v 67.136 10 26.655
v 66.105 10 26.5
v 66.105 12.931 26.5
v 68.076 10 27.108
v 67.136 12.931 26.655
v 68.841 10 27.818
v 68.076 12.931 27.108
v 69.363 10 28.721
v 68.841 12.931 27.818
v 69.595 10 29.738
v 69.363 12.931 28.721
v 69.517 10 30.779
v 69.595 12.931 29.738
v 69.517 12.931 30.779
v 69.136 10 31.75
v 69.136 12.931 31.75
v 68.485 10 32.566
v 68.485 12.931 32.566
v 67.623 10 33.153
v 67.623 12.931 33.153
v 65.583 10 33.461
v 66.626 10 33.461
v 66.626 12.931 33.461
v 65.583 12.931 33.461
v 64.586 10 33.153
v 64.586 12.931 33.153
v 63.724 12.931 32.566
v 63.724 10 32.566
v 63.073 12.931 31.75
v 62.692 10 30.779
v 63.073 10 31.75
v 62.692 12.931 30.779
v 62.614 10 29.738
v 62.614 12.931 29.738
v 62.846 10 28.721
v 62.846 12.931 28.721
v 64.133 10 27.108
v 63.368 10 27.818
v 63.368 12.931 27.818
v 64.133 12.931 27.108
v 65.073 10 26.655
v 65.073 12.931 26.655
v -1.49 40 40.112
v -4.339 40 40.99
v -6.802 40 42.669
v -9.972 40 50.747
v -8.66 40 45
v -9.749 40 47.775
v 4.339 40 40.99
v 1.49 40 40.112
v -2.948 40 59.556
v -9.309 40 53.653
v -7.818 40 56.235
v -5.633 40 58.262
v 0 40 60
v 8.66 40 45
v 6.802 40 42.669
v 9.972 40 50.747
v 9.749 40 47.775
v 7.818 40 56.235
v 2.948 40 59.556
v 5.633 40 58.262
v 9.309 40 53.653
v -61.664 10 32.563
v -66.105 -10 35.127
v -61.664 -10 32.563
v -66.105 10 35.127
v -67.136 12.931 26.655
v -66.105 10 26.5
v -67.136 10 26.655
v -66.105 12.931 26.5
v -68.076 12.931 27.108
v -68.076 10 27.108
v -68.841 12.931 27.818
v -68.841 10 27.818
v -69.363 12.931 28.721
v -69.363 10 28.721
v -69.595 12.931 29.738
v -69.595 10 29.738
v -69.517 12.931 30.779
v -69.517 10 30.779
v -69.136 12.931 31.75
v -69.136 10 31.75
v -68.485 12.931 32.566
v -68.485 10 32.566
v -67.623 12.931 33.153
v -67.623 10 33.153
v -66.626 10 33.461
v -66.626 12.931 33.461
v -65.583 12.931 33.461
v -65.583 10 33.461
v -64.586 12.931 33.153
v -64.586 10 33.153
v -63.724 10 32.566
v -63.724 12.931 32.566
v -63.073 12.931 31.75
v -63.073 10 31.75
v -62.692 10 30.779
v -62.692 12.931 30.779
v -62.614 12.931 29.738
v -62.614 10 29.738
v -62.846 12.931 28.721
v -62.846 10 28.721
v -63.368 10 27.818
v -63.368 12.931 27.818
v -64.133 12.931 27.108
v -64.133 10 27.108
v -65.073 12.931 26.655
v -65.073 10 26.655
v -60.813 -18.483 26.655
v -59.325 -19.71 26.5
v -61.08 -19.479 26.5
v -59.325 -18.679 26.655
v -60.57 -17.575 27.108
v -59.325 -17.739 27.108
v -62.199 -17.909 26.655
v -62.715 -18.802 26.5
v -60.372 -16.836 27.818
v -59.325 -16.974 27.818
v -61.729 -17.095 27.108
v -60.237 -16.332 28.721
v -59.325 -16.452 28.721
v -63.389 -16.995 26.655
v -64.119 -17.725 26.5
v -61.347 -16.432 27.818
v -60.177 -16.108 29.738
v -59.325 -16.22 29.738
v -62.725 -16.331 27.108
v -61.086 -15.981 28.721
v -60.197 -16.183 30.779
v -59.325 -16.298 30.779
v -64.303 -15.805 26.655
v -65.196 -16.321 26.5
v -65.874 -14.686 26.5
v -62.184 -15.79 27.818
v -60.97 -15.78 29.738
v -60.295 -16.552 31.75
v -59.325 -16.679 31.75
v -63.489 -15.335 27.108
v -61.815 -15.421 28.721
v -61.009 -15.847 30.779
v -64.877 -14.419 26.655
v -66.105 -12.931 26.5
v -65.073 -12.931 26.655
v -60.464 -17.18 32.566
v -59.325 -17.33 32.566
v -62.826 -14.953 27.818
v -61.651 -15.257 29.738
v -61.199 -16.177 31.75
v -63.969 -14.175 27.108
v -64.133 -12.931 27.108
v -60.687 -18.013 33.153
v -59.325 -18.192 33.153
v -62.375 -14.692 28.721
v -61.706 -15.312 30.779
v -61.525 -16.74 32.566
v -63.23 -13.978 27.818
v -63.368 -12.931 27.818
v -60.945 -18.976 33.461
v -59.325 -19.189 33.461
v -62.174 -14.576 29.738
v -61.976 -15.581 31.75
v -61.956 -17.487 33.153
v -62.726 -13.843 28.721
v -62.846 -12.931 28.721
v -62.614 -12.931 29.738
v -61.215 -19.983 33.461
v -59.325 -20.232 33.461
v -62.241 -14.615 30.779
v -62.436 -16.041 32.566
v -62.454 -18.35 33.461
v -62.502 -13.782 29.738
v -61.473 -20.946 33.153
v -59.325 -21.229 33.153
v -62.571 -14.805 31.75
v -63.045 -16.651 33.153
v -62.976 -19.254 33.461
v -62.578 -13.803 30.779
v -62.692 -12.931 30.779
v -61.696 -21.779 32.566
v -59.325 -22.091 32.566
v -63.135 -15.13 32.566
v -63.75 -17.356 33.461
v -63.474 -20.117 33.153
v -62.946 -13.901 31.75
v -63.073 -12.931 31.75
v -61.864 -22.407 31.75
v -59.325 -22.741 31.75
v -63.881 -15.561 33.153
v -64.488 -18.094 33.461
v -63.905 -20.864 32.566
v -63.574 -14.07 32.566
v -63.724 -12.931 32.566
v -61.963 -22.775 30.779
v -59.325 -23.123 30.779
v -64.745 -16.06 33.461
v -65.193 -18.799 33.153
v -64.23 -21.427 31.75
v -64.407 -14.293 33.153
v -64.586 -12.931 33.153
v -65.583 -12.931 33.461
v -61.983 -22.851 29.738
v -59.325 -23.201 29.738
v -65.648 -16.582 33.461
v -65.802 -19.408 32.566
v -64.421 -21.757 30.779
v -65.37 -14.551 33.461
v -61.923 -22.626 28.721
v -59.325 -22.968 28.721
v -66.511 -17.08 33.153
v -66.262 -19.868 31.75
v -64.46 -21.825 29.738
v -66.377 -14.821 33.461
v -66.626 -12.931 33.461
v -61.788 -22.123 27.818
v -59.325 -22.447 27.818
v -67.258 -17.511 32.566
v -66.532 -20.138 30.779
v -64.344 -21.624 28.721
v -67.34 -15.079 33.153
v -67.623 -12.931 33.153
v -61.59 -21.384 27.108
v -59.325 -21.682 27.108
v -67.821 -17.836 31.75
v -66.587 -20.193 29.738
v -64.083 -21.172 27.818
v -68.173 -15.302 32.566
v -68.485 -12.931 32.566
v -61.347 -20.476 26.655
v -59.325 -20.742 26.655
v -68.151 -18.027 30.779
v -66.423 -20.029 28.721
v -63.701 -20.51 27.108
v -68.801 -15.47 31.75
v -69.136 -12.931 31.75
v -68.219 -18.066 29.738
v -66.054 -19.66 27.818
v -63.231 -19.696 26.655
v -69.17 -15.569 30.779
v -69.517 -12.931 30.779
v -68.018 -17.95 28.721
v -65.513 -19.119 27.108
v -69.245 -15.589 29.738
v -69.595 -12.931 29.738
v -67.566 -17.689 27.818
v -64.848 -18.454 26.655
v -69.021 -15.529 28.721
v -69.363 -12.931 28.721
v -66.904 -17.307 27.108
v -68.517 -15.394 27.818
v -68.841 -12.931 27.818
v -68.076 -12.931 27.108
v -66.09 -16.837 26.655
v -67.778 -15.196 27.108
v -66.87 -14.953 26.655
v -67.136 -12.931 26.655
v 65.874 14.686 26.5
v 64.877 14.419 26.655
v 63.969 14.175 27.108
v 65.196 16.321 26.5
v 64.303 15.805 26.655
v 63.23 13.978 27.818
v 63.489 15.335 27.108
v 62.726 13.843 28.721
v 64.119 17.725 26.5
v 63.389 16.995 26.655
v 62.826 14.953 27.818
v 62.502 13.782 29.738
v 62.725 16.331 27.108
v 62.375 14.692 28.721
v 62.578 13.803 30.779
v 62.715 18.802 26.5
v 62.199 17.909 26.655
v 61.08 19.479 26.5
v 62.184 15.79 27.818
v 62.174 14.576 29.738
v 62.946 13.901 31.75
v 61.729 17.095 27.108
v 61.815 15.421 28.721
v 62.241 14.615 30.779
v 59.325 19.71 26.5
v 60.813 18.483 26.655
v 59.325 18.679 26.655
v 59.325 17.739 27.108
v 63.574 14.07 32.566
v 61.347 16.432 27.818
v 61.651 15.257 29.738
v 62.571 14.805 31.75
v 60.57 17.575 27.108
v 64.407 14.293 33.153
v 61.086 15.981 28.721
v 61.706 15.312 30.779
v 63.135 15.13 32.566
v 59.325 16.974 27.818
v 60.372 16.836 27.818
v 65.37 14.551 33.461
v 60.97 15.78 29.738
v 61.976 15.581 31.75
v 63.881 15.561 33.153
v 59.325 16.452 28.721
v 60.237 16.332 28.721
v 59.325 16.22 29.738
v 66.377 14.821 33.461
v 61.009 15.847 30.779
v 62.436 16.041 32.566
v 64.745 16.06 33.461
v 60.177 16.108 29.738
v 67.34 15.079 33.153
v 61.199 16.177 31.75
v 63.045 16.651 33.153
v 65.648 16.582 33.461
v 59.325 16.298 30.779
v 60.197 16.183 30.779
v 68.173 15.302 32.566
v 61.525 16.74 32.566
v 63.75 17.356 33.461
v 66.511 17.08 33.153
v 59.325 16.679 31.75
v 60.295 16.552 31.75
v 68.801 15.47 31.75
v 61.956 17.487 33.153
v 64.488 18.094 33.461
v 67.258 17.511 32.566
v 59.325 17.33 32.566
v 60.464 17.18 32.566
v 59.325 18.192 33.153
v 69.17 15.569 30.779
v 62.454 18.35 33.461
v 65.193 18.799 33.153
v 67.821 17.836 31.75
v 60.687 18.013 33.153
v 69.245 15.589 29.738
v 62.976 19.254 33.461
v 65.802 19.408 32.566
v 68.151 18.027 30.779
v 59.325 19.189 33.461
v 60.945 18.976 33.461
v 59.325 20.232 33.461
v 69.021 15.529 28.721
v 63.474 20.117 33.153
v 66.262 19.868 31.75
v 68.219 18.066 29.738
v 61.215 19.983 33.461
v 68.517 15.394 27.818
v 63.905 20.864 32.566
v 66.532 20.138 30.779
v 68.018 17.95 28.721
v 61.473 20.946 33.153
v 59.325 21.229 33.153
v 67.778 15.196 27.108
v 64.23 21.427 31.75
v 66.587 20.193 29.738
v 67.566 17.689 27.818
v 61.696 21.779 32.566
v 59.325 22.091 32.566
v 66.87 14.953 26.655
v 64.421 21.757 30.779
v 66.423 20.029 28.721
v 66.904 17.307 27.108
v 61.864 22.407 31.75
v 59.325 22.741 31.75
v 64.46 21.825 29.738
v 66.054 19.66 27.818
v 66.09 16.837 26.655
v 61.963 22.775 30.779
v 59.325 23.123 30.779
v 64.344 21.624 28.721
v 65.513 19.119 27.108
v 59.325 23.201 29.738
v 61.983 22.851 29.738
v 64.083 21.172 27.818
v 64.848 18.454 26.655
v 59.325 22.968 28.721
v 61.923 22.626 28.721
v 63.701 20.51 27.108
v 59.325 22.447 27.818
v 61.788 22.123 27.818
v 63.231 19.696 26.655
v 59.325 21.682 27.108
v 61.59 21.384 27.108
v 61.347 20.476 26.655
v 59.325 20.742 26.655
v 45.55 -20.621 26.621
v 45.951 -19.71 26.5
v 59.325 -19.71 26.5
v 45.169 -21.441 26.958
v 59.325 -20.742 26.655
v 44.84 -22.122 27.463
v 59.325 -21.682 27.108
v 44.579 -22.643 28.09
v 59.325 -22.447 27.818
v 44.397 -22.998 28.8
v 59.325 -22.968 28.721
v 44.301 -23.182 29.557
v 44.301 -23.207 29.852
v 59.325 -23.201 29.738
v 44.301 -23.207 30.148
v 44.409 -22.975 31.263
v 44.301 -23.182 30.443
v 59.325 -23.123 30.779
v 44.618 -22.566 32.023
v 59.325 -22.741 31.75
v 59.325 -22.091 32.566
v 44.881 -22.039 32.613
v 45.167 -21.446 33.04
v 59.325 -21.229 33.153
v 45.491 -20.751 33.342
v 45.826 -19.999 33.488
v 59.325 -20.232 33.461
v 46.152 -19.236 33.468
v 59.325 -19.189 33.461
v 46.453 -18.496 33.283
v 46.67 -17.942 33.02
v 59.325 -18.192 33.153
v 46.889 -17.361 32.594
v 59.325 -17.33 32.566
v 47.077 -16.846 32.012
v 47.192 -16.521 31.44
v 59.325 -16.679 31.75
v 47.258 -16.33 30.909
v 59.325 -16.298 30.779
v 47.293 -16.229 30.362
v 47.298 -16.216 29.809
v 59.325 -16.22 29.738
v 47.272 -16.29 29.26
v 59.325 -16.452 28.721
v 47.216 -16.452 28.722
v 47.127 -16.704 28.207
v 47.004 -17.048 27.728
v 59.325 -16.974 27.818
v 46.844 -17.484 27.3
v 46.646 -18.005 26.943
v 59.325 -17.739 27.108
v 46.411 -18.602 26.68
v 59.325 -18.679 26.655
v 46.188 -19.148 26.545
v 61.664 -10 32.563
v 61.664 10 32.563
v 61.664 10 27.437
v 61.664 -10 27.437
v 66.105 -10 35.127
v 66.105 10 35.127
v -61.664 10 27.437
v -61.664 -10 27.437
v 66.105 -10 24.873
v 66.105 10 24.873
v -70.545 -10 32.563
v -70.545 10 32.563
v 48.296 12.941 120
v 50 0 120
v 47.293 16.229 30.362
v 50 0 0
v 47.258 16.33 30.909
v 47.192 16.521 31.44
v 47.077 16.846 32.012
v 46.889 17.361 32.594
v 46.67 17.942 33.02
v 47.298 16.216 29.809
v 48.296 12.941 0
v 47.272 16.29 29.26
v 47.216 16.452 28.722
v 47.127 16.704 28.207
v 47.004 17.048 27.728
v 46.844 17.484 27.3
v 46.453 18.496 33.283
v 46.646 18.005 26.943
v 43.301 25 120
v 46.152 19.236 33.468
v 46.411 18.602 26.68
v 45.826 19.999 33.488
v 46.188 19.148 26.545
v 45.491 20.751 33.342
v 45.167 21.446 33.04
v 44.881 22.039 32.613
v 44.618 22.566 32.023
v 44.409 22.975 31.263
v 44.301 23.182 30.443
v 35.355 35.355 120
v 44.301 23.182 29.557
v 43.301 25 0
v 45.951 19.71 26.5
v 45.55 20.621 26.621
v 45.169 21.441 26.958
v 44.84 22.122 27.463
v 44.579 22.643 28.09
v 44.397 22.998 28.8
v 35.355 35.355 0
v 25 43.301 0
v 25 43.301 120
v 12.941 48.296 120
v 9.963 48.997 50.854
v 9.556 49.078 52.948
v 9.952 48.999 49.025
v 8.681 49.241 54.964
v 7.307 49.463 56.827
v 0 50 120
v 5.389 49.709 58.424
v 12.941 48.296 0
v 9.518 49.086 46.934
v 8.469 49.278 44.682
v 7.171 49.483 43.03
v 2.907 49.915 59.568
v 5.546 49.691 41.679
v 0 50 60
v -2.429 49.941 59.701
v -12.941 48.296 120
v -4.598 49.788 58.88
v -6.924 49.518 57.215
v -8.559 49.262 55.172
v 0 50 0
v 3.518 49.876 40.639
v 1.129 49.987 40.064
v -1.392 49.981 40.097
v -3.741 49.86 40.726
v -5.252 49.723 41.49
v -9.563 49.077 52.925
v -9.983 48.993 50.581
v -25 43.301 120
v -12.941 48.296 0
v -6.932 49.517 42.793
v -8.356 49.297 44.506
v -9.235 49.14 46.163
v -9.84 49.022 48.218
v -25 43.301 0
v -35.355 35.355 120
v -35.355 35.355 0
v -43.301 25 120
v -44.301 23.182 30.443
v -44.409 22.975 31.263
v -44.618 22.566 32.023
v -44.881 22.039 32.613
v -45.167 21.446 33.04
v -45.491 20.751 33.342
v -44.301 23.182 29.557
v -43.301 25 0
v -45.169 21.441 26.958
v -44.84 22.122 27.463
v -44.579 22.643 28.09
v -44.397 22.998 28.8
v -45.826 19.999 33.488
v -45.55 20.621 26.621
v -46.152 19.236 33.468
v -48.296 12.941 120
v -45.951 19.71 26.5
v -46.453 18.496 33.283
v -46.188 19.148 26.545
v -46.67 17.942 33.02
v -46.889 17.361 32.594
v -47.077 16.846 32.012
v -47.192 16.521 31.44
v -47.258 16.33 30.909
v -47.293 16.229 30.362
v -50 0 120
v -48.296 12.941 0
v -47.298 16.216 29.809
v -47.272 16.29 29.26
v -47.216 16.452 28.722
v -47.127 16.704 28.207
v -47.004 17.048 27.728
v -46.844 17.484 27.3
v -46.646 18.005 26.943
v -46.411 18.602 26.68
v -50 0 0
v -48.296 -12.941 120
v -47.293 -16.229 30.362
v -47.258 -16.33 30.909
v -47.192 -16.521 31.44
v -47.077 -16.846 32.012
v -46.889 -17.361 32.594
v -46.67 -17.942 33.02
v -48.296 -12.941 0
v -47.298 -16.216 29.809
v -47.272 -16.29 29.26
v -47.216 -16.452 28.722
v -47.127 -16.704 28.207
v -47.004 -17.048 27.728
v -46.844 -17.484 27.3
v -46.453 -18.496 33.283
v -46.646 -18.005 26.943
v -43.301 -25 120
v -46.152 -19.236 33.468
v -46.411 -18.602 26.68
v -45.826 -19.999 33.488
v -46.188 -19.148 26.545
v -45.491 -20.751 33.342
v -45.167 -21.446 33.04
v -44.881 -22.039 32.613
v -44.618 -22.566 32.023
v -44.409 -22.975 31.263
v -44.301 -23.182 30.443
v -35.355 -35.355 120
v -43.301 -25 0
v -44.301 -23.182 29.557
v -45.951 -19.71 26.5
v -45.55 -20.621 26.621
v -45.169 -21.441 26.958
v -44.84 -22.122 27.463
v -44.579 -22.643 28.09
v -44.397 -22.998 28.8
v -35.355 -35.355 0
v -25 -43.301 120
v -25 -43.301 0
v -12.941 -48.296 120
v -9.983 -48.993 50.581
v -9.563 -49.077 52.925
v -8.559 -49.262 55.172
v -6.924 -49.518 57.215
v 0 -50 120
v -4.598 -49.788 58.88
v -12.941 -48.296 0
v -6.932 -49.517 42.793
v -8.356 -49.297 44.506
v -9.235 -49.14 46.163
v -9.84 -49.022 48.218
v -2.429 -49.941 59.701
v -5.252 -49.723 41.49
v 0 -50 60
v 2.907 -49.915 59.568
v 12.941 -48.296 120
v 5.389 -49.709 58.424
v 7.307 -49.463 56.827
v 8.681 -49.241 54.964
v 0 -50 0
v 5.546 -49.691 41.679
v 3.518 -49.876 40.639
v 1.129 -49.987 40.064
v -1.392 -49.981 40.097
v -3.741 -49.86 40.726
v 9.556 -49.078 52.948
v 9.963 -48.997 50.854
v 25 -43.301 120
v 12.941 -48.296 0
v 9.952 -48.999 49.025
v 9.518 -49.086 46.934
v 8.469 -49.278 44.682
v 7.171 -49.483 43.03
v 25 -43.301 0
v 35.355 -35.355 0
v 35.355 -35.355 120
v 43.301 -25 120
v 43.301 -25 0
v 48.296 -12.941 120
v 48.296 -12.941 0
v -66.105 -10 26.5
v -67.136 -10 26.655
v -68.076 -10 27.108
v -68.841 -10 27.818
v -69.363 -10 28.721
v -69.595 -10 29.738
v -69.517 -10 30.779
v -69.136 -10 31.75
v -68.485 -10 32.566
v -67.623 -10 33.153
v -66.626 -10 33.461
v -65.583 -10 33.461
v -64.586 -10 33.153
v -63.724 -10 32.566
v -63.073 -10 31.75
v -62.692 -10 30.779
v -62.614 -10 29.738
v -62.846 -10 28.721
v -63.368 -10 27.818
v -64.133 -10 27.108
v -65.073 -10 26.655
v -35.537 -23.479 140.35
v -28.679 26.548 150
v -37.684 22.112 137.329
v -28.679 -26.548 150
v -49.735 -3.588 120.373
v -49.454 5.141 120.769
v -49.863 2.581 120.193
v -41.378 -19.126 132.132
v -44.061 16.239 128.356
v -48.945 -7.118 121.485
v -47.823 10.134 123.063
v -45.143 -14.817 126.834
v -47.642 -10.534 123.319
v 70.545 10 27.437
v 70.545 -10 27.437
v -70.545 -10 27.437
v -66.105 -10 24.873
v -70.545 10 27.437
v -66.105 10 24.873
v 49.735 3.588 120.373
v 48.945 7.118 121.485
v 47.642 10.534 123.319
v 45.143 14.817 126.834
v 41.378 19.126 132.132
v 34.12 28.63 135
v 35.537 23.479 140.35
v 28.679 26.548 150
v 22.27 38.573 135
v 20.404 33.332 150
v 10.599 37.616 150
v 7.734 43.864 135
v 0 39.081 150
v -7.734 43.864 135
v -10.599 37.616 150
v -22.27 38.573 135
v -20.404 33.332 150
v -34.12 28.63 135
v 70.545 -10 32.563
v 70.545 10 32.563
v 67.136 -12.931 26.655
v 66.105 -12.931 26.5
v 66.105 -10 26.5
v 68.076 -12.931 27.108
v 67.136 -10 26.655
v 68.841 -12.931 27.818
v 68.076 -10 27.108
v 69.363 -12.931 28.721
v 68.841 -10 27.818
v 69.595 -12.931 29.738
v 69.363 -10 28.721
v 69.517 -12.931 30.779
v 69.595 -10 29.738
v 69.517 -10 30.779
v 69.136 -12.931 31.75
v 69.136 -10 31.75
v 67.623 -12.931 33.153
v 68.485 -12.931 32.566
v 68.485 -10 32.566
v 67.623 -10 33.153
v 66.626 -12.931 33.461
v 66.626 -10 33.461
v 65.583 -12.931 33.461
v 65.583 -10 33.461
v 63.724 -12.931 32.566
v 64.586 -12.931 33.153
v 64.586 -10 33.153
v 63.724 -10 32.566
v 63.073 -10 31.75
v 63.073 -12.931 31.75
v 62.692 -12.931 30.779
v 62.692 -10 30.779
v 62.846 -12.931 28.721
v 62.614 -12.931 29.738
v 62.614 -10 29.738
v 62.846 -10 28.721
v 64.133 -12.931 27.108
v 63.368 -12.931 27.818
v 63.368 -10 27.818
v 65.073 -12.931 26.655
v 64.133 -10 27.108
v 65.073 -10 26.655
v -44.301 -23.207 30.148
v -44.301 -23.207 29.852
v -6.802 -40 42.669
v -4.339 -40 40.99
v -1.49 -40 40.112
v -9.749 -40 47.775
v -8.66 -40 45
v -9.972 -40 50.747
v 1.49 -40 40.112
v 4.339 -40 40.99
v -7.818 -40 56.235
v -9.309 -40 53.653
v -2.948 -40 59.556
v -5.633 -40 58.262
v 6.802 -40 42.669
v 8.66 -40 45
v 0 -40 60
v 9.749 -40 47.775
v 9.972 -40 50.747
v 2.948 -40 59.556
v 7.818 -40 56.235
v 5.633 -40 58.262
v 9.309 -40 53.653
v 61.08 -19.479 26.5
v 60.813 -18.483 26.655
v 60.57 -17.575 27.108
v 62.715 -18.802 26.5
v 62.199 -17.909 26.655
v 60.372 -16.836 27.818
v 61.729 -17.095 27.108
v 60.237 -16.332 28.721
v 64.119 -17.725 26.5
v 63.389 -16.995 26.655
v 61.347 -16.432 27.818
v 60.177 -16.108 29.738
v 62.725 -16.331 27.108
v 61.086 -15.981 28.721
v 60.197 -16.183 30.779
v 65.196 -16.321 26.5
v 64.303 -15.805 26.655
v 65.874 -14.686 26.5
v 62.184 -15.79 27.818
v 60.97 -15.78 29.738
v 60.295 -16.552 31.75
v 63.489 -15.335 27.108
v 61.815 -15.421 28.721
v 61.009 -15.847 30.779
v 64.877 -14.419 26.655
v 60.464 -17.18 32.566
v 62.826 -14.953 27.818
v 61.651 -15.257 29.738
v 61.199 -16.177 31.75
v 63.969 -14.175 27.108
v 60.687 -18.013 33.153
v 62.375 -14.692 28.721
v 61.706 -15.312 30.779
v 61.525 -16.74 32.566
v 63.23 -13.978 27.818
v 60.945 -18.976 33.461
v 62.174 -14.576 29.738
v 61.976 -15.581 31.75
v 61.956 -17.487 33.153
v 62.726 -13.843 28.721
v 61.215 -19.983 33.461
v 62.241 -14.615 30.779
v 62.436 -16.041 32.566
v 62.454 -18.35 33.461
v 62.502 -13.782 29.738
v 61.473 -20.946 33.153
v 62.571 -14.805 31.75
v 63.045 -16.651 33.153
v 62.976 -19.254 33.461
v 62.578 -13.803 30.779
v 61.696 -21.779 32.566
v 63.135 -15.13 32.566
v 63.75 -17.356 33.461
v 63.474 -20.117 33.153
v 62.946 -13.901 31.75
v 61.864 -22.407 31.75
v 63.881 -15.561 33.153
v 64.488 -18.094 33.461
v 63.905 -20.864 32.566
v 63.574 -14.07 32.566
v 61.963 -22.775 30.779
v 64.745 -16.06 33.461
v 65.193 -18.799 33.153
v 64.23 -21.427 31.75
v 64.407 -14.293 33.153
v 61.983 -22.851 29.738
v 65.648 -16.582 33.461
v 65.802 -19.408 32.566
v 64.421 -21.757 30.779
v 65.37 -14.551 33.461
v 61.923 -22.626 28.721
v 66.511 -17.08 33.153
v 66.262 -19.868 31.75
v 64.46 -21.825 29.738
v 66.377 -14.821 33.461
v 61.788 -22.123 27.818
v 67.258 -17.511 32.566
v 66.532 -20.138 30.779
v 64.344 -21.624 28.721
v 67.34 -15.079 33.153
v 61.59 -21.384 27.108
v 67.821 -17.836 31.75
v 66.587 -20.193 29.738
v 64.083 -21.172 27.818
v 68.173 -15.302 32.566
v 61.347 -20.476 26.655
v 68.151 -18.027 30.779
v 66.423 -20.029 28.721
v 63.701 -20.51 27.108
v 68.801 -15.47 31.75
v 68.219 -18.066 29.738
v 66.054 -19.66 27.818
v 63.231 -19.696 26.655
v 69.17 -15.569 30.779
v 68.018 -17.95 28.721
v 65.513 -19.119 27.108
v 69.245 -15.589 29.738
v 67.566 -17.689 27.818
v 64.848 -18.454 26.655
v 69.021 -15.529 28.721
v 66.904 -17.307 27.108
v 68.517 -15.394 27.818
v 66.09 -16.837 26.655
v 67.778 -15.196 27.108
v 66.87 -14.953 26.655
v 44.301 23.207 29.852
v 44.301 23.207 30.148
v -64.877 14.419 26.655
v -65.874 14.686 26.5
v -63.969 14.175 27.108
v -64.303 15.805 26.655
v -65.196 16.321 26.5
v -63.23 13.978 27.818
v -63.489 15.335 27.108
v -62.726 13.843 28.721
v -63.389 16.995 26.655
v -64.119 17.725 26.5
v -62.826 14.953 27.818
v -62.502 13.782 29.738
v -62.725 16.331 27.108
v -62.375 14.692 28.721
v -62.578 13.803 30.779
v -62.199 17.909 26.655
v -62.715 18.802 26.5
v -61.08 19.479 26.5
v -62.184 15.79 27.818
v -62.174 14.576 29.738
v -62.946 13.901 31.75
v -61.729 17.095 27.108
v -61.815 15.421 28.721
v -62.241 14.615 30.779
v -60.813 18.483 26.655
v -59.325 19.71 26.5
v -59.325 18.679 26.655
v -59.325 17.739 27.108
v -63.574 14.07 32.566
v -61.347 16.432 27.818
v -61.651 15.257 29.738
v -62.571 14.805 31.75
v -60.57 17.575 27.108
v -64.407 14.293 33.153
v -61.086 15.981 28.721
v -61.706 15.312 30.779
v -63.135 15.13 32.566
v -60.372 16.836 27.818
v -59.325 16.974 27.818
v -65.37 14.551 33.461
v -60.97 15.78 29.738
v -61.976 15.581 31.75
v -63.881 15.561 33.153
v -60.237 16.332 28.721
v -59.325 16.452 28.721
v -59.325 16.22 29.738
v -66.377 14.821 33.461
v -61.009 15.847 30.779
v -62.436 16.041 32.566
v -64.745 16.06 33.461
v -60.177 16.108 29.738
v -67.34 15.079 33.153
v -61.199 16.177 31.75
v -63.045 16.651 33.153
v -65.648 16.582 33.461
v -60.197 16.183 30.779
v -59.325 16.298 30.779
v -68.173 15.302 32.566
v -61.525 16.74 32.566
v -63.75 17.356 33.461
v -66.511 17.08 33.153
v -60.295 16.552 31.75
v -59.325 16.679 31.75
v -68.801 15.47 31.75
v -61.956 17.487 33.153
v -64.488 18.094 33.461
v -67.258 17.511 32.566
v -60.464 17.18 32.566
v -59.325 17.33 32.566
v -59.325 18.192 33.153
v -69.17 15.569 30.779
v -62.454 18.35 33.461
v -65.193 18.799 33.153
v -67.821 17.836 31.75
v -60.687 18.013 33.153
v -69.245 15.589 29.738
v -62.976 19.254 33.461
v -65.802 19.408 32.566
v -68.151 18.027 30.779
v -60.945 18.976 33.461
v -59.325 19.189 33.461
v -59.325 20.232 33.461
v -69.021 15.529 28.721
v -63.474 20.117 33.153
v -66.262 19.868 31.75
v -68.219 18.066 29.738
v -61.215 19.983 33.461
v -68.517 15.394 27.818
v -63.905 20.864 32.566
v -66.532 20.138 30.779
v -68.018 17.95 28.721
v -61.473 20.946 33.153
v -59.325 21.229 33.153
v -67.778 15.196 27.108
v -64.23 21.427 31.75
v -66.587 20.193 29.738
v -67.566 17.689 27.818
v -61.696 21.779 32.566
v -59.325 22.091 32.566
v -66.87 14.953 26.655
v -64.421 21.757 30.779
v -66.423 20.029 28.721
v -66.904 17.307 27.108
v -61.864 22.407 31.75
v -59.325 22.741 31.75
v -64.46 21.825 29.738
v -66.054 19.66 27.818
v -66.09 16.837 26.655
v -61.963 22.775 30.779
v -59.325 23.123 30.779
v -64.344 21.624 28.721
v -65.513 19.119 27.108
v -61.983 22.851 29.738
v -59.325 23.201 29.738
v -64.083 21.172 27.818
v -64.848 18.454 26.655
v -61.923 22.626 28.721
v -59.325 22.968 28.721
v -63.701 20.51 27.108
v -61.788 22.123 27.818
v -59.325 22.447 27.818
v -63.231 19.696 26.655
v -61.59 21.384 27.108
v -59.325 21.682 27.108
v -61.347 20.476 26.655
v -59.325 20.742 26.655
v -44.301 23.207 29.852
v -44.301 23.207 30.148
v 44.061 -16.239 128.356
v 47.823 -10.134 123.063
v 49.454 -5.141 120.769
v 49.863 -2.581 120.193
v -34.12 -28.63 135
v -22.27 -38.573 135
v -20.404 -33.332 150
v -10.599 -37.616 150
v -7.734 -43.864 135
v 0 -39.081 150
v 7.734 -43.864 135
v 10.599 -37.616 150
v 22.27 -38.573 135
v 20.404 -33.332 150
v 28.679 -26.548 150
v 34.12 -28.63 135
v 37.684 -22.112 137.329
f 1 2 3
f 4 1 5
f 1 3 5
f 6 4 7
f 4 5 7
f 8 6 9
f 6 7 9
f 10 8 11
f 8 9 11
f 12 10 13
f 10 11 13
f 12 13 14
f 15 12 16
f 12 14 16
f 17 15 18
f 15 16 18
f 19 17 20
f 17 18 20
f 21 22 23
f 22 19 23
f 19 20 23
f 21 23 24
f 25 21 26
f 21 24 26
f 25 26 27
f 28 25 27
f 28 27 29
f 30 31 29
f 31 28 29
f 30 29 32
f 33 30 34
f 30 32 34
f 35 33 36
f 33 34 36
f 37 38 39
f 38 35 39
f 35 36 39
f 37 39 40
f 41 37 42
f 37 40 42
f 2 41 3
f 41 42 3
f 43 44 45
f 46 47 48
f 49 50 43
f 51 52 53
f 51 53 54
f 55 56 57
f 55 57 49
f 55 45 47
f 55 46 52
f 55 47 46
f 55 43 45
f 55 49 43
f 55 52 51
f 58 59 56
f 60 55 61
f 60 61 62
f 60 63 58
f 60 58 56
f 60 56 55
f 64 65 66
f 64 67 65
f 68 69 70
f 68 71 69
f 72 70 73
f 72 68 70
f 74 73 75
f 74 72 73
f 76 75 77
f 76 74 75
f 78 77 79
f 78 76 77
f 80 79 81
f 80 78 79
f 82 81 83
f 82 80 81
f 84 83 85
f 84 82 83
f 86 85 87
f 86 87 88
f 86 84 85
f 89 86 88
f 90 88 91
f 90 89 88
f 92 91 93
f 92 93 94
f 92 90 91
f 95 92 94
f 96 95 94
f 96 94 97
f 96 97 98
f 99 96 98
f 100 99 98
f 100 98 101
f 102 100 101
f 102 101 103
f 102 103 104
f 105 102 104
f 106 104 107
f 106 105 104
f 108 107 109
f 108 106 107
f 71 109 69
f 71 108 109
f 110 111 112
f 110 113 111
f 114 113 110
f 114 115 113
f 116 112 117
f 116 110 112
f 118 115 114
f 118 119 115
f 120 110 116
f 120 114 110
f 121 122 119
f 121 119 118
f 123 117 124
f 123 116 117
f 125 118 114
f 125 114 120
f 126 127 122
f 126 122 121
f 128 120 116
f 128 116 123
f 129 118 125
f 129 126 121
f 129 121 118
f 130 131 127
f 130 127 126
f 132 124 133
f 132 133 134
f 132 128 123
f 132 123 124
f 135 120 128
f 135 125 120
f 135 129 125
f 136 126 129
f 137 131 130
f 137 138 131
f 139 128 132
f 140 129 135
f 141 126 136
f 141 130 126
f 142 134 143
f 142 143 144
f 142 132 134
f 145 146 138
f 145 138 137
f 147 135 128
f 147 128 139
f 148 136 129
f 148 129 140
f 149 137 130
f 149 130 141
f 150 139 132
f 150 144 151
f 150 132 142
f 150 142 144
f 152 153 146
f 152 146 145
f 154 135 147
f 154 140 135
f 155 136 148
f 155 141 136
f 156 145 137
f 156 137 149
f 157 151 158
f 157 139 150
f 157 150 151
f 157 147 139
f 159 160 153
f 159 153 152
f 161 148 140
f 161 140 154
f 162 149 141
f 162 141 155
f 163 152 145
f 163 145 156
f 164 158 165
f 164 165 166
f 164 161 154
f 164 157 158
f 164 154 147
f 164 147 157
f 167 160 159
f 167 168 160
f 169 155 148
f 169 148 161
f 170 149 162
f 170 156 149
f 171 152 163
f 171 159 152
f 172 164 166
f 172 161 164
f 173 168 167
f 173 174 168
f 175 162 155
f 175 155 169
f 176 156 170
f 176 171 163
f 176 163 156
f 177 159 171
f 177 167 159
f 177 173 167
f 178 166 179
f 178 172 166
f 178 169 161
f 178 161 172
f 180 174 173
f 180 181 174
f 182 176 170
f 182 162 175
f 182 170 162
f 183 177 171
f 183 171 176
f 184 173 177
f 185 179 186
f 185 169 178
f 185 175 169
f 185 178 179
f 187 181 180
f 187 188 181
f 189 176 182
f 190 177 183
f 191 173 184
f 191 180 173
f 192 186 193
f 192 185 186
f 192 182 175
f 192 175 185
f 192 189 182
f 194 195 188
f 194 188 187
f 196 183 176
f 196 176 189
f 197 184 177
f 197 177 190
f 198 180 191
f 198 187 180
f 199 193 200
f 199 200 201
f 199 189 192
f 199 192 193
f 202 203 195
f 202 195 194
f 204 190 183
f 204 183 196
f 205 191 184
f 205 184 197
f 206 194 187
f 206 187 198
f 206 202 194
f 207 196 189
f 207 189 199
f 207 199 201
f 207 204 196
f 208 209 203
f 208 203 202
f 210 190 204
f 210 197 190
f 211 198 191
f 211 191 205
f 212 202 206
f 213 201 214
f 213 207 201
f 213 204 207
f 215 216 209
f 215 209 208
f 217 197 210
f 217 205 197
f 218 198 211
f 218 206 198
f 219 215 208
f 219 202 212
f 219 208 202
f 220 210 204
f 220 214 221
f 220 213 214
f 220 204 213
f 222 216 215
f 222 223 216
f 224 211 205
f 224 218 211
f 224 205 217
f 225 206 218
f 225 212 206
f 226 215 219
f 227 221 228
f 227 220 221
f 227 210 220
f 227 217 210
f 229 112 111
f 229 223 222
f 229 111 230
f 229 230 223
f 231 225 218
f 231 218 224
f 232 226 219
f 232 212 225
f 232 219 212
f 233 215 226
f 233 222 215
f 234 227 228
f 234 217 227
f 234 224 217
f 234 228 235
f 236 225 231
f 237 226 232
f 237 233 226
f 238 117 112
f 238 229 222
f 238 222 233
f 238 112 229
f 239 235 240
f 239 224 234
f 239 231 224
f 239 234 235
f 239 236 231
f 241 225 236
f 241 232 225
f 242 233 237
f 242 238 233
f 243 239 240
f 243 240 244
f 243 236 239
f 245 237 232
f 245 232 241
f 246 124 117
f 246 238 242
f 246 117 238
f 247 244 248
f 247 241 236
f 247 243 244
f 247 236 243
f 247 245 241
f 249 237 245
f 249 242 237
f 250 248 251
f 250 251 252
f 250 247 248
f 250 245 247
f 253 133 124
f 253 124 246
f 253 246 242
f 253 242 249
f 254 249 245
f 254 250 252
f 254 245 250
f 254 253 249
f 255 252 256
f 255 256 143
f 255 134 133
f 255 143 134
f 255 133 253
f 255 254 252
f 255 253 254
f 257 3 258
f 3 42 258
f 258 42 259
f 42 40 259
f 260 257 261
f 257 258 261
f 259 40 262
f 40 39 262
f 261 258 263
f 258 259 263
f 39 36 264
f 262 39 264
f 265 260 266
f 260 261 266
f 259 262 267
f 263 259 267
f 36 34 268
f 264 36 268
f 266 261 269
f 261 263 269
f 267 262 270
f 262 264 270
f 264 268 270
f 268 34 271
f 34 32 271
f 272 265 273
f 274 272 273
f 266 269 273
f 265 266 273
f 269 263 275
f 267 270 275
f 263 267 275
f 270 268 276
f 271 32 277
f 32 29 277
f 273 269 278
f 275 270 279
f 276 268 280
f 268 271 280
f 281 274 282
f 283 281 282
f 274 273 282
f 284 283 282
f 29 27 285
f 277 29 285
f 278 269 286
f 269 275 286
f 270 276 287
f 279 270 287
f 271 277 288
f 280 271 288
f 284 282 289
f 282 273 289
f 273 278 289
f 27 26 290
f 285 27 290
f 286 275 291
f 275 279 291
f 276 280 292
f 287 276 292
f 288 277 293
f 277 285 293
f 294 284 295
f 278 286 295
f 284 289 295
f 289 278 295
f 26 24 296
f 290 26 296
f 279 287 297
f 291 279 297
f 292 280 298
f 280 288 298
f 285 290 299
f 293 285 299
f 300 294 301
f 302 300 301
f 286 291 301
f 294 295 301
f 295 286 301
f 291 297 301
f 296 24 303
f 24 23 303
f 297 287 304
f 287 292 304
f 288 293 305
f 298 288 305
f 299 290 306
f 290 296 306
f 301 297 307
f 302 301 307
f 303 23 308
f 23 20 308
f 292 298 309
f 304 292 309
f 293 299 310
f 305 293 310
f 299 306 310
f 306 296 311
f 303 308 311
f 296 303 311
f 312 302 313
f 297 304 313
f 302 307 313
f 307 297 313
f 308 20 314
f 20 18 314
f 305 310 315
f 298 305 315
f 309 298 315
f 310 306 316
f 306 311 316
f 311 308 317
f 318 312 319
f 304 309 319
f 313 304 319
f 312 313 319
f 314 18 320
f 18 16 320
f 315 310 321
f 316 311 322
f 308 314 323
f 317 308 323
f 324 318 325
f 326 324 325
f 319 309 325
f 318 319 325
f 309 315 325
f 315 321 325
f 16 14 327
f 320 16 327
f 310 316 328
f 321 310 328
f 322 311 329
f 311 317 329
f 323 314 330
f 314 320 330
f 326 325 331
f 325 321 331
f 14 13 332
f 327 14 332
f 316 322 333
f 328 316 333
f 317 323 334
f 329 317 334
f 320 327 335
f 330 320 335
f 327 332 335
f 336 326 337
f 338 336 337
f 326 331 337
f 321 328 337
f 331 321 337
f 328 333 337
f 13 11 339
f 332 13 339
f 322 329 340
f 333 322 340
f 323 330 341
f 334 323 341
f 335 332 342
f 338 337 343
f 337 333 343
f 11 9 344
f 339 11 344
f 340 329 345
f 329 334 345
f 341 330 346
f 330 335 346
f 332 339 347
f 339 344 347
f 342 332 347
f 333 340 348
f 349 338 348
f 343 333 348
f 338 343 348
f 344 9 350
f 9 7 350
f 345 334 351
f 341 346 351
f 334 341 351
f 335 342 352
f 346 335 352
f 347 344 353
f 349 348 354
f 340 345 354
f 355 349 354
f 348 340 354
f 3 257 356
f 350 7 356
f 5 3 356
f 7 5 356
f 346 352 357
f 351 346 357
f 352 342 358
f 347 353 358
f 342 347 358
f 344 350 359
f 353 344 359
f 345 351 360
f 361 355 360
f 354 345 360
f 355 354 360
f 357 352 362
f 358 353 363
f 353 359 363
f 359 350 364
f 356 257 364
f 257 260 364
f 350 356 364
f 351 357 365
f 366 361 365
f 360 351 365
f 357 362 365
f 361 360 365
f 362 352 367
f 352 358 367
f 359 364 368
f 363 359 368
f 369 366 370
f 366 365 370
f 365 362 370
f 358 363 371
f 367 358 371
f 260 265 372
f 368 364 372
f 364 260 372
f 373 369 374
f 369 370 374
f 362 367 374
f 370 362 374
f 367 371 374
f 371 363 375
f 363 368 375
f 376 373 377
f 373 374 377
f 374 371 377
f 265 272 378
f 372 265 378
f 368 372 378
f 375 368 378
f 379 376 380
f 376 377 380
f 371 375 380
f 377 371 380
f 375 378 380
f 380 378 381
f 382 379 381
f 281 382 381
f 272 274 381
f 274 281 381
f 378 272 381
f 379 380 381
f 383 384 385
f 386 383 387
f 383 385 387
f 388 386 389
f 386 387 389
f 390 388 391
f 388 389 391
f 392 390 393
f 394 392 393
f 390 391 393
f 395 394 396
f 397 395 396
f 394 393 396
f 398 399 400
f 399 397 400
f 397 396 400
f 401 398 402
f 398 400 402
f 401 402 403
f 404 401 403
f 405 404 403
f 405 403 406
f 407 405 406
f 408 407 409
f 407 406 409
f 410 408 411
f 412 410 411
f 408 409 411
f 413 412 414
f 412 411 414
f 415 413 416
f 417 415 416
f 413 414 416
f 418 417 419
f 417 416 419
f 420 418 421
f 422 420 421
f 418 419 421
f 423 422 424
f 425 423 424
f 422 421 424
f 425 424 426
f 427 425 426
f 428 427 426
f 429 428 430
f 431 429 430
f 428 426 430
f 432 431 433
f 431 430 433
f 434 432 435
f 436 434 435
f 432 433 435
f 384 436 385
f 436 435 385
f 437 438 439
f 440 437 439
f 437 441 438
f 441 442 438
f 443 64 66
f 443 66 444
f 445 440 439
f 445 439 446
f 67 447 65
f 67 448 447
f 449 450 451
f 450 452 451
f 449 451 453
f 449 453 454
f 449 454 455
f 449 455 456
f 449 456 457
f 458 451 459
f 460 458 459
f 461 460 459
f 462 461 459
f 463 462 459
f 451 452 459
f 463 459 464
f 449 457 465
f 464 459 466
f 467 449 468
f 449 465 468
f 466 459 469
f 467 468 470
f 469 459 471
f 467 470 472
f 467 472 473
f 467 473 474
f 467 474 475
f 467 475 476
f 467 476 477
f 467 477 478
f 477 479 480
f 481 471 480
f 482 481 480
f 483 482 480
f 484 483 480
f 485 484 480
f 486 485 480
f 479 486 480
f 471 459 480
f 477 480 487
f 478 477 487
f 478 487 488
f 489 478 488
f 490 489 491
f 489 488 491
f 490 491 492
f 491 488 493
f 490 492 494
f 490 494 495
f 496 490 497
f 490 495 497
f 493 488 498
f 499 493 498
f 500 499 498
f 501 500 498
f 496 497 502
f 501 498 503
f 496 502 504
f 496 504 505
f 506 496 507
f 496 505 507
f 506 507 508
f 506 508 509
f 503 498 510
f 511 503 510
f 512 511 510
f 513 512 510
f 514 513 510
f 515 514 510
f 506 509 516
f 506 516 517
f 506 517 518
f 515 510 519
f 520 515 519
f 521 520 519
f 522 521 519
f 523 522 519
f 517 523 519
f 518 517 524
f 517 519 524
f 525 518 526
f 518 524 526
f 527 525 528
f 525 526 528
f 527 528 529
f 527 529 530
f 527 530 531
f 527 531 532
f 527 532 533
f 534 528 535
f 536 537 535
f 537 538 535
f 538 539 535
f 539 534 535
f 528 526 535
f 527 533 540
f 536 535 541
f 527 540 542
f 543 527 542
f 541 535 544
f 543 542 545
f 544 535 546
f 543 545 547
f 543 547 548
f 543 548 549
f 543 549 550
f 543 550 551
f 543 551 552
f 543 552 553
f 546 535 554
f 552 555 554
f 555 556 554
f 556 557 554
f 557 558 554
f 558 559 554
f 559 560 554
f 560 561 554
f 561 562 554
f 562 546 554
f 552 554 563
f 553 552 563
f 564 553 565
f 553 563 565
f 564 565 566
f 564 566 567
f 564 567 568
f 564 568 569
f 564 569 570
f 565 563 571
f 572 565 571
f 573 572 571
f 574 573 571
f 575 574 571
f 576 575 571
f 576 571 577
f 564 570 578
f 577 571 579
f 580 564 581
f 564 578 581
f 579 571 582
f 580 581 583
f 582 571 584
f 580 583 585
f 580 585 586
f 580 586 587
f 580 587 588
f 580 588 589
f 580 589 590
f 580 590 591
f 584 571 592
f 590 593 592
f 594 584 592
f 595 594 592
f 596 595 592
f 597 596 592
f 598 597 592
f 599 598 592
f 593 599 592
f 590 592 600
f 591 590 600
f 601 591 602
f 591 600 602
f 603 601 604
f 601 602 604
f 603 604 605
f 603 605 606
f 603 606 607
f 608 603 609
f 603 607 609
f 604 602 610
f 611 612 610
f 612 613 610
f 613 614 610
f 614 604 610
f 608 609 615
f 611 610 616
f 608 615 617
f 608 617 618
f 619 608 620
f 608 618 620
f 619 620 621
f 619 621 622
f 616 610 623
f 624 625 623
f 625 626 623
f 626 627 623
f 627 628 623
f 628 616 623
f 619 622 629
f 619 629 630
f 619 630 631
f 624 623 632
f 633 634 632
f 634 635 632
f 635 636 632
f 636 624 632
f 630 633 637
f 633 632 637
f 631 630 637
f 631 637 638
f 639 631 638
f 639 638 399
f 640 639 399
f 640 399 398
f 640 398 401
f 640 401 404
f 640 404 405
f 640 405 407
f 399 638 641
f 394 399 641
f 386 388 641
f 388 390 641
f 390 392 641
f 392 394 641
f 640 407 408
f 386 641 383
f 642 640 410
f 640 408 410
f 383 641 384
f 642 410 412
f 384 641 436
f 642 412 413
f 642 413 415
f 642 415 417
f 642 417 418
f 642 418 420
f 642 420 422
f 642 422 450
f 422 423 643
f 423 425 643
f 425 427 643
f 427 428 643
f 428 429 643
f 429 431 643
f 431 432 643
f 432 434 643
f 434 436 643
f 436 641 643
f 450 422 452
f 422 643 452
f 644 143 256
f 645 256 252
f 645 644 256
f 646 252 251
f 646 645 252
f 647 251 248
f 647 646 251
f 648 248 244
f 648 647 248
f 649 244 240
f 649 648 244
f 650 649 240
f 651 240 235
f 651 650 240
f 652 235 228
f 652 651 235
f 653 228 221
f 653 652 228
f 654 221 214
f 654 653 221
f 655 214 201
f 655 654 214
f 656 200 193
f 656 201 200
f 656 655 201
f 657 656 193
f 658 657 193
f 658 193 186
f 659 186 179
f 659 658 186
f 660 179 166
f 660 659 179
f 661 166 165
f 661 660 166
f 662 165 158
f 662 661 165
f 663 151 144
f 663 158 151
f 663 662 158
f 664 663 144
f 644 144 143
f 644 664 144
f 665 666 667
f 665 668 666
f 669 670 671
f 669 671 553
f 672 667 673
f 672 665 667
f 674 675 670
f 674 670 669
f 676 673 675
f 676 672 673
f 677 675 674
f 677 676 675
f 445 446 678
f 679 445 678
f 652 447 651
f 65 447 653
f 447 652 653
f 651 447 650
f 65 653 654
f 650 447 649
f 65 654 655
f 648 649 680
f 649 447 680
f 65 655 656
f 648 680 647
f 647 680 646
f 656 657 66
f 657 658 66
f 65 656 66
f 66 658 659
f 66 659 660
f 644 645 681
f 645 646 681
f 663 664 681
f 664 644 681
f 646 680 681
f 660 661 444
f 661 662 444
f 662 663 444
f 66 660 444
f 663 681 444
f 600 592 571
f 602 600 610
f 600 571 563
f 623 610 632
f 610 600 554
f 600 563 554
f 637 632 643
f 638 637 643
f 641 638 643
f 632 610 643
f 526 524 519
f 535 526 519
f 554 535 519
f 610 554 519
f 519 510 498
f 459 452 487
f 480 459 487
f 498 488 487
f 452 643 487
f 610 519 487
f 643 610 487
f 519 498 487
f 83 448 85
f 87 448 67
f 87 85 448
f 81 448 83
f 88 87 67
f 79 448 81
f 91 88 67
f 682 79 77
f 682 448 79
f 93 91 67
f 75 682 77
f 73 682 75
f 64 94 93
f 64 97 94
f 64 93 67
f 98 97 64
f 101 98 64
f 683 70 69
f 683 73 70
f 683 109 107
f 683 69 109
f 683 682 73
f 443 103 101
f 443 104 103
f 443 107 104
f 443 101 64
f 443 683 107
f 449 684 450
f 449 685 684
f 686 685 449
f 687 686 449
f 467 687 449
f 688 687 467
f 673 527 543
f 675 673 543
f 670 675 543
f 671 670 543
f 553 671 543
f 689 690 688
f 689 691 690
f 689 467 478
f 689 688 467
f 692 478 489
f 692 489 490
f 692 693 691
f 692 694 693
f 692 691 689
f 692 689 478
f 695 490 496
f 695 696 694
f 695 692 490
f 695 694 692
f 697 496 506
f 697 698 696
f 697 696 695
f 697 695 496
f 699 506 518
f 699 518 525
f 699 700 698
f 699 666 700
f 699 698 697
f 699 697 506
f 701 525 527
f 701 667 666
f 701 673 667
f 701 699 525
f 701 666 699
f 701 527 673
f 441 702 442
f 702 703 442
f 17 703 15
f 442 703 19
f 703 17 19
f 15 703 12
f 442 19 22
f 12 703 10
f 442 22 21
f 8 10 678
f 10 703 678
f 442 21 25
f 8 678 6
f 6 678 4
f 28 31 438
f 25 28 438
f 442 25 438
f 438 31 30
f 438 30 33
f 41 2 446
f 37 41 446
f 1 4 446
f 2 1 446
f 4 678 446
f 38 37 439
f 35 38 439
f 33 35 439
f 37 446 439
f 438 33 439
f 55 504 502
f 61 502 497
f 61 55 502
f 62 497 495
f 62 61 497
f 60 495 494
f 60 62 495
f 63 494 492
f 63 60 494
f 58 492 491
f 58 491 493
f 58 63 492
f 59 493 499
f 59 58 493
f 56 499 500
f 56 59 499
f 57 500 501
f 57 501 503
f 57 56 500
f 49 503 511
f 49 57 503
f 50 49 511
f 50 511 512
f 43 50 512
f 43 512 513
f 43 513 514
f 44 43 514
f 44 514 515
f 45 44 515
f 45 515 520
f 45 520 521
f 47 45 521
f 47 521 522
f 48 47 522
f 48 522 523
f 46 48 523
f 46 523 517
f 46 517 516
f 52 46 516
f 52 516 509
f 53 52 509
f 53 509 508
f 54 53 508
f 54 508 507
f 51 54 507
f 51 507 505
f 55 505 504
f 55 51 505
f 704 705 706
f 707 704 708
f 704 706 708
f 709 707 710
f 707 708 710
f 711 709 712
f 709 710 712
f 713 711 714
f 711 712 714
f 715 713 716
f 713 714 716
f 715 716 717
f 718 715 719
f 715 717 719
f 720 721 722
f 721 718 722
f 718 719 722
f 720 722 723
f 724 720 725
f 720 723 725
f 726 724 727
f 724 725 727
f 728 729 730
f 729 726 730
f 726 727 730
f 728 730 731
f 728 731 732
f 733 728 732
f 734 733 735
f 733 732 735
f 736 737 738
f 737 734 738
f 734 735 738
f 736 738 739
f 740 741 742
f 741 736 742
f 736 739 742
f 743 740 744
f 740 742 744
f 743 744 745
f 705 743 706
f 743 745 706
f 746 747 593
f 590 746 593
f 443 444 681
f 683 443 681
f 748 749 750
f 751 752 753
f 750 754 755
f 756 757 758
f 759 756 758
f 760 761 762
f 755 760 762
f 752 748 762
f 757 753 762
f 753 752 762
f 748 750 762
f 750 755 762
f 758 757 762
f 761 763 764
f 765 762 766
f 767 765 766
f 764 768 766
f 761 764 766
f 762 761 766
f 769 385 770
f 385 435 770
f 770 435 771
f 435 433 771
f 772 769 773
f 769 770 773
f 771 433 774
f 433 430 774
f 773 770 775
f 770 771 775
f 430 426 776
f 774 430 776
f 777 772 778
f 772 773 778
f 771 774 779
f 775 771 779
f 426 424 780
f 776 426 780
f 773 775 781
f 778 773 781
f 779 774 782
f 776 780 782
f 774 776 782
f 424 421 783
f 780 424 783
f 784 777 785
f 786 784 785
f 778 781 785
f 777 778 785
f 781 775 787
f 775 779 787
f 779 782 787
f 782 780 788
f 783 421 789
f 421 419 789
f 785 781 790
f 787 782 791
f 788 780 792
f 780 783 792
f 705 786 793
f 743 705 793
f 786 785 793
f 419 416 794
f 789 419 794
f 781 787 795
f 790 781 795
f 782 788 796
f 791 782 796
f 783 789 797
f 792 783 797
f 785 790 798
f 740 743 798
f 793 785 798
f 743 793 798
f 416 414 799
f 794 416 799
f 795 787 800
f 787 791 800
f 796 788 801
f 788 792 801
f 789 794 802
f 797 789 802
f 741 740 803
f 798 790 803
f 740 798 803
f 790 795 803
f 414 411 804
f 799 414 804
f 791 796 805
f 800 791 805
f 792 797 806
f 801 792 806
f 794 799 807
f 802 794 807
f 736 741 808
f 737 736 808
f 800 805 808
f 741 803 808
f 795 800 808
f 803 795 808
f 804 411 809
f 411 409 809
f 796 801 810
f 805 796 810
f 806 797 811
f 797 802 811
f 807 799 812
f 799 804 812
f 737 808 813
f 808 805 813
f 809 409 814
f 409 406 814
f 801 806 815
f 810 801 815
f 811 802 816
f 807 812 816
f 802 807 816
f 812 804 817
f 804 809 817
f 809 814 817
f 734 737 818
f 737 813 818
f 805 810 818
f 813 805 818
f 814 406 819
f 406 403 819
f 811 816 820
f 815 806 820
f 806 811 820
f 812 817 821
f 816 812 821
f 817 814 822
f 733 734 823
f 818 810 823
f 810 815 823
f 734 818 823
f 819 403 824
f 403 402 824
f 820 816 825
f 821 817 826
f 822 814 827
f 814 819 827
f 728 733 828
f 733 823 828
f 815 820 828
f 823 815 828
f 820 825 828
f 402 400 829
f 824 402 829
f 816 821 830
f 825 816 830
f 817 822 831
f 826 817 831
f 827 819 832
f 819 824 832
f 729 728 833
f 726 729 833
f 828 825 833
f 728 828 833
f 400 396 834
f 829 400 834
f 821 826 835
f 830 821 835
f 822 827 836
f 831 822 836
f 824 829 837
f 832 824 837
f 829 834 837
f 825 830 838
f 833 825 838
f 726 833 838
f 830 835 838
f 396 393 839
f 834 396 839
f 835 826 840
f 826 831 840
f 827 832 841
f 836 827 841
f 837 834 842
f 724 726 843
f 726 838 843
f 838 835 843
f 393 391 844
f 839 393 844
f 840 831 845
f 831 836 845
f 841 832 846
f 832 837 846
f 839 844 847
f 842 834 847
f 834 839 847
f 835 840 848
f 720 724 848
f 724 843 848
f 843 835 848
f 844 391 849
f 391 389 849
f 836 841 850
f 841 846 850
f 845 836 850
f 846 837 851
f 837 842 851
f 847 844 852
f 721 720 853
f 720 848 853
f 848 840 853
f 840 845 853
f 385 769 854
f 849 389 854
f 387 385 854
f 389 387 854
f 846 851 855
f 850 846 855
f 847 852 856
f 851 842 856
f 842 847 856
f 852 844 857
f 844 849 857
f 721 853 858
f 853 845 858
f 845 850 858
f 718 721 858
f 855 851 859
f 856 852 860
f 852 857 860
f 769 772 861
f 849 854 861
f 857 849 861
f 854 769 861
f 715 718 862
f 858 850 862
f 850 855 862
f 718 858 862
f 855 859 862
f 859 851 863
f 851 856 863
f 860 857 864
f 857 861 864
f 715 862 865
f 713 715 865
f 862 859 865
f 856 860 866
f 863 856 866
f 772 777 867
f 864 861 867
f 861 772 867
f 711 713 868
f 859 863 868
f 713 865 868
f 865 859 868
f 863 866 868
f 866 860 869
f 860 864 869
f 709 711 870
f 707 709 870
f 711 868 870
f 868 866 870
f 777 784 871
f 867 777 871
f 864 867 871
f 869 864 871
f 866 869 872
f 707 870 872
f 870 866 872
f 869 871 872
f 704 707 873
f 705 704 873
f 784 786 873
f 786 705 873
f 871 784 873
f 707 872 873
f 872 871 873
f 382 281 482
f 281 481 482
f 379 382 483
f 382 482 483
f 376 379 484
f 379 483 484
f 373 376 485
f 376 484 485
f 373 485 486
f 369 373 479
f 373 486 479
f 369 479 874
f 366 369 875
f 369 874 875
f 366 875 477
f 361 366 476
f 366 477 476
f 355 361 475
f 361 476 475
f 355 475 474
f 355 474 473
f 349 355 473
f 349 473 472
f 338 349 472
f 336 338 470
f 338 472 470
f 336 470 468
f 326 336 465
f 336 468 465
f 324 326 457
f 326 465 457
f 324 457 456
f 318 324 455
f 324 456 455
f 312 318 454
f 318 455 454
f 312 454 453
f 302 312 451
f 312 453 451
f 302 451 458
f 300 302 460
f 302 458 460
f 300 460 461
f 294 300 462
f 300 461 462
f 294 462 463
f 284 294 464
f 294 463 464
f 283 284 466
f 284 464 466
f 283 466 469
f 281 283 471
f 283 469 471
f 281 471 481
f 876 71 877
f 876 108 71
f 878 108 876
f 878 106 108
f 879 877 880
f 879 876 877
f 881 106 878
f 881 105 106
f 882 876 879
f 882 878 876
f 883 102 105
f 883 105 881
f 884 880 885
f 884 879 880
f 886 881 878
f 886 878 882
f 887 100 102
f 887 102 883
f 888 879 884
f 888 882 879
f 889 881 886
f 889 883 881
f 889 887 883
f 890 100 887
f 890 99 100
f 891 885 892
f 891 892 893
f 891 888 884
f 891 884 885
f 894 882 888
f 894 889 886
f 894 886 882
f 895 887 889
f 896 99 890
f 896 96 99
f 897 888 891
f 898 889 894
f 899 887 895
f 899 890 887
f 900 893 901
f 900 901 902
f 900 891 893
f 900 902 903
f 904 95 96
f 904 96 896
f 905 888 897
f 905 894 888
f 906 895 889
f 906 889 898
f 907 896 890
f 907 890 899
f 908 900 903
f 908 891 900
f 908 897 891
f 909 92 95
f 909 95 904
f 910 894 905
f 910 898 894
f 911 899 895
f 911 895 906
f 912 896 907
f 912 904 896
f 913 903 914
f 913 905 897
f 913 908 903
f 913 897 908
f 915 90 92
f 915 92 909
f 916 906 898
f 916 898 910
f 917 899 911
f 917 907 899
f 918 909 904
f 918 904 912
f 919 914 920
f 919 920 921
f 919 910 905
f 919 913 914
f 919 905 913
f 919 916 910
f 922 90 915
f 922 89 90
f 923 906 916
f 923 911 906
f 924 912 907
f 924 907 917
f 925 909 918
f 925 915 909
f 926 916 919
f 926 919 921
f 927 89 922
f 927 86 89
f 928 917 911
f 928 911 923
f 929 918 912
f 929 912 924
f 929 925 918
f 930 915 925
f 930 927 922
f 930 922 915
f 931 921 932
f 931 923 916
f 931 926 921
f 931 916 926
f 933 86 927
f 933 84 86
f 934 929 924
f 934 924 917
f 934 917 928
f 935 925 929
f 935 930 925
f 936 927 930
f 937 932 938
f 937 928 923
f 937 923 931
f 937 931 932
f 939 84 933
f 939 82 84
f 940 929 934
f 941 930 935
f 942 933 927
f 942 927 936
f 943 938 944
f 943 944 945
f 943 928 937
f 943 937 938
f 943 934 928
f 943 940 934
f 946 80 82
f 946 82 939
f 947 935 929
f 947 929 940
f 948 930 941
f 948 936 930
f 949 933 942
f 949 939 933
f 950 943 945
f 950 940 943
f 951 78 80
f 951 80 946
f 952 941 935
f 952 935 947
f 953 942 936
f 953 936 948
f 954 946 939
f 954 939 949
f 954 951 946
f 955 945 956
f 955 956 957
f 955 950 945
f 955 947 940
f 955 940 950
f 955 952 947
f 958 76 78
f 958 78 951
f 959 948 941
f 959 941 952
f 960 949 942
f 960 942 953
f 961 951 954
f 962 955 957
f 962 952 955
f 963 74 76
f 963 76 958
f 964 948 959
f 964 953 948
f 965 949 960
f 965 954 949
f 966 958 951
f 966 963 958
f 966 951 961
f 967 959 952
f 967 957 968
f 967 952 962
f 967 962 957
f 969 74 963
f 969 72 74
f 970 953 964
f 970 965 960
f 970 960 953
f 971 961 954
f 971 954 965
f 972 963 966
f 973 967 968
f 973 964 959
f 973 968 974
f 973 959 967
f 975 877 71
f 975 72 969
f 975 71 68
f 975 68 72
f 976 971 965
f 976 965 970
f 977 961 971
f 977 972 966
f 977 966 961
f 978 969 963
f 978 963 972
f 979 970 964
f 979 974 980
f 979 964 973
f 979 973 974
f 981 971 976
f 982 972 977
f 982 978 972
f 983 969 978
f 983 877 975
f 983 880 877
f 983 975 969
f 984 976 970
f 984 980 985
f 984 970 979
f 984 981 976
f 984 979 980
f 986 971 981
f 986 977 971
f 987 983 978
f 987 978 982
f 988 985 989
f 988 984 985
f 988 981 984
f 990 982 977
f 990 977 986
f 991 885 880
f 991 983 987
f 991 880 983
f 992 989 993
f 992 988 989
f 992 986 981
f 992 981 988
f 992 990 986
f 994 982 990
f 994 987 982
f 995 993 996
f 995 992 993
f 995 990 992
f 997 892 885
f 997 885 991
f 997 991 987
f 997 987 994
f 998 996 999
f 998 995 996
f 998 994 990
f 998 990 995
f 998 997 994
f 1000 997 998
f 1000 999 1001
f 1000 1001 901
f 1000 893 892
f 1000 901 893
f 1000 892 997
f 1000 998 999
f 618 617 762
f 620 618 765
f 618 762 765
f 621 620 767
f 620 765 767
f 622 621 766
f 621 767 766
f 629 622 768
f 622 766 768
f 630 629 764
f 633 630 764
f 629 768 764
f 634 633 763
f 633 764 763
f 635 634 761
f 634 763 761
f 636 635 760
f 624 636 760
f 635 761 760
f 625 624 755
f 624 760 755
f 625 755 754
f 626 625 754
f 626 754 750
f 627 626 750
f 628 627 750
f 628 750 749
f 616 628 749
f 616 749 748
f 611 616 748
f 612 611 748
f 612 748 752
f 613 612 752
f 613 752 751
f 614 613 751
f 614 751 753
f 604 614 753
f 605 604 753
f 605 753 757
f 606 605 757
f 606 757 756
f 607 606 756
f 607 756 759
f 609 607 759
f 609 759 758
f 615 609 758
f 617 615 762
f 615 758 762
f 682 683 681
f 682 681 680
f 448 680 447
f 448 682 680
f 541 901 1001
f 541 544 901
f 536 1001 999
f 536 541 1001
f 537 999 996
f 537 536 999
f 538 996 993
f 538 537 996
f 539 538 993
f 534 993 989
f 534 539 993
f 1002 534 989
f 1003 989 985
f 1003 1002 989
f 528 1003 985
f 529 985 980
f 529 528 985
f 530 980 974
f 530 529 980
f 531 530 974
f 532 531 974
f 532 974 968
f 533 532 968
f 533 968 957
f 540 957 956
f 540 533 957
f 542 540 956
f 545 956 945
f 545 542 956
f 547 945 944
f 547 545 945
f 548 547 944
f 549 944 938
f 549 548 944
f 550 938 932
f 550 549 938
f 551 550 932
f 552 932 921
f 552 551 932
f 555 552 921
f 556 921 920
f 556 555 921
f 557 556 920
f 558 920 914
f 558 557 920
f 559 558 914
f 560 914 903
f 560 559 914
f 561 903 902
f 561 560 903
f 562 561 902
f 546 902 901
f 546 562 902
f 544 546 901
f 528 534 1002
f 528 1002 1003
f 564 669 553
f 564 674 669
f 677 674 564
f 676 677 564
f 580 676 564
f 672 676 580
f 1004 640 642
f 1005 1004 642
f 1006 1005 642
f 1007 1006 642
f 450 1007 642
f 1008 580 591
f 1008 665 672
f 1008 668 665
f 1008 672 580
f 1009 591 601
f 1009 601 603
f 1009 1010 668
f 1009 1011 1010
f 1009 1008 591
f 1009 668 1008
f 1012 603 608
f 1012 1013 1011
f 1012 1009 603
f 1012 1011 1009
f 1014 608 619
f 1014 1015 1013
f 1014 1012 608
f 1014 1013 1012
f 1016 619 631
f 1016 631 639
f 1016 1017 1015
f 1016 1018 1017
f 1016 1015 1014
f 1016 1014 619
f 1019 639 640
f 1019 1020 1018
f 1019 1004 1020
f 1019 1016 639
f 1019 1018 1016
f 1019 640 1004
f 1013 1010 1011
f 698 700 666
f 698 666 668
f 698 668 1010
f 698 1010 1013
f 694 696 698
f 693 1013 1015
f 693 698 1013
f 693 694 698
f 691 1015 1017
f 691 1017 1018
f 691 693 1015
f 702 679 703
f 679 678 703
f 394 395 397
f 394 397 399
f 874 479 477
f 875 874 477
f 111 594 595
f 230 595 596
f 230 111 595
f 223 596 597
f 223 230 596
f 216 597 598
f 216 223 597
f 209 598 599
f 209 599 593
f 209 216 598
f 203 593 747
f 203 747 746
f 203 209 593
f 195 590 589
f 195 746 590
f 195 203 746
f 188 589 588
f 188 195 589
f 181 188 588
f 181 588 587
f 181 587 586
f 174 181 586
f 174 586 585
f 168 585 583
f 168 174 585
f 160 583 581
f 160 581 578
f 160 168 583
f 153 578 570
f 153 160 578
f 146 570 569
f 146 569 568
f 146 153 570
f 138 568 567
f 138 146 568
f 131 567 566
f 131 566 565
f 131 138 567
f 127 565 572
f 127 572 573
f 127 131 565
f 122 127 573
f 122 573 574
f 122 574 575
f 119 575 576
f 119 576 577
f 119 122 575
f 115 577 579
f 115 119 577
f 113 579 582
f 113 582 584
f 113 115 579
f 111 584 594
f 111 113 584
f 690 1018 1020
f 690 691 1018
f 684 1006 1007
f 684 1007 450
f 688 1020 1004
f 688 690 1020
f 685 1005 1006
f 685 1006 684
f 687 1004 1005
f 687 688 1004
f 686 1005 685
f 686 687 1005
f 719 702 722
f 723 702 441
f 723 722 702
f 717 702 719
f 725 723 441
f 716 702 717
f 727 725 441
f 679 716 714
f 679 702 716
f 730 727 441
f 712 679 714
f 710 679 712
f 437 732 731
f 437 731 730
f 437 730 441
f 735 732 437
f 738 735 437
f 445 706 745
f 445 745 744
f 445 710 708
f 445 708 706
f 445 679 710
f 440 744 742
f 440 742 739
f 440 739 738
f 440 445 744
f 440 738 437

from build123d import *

# Parameters (mm, degrees)
IZIM1_R                     = 50
Y_KSEKLIK_EKSTR_ZYON1_DEPTH = 150
PAH1_SIZE                   = 30
PAH1_SIZE2                  = 10.919107028
KES_EKSTR_ZYON1_DEPTH       = 50
S_P_R1_PROFILE_R            = 3.5
KES_EKSTR_ZYON2_START       = -40
IZIM20_R                    = 10
KES_EKSTR_ZYON2_DEPTH       = 100
Y_KSEKLIK_EKSTR_ZYON2_DEPTH = 10


with BuildPart() as part:
    # Çizim1 → Yükseklik-Ekstrüzyon1 (new body)
    with BuildSketch(Plane.XY):
        Circle(IZIM1_R)
    extrude(amount=Y_KSEKLIK_EKSTR_ZYON1_DEPTH)

    # Pah1
    pah1_edges = [part.edges().sort_by_distance(p)[0] for p in [
        (-50, 0, 150),
    ]]
    pah1_side = [part.faces().sort_by_distance(p)[0] for p in [
        (-50, 0, 75),
    ]]
    chamfer(pah1_edges, length=PAH1_SIZE, length2=PAH1_SIZE2, reference=pah1_side[0])

    # Çizim5 → Kes-Ekstrüzyon1 (cut, symmetric)
    with BuildSketch(Plane(origin=(0, 0, 0), x_dir=(1, 0, 0), z_dir=(0, 1, 0))):
        Polygon((-50, -120), (-120.002601454, -158.048405528), (-22.959282712, -158.048405528), align=None)
        Polygon((22.959282712, -158.048405528), (50, -120), (120.002601454, -158.048405528), align=None)
    extrude(amount=KES_EKSTR_ZYON1_DEPTH, both=True, mode=Mode.SUBTRACT)

    # Süpür1: sweep along a path in Çizim6
    with BuildLine(Plane.XY.offset(30)) as s_p_r1_path:
        Line((-44.301038276, -19.710381189), (-59.325338364, -19.710381189))
        ThreePointArc((-59.325338364, -19.710381189), (-64.118952606, -17.724801158), (-66.104532637, -12.931186916))
        Line((-66.104532637, -12.931186916), (-66.104532637, 12.931186916))
        ThreePointArc((-66.104532637, 12.931186916), (-64.118952606, 17.724801158), (-59.325338364, 19.710381189))
        Line((-59.325338364, 19.710381189), (-44.301038276, 19.710381189))
    # Süpür1 profile (on start of the path) → Süpür1 (sweep)
    with BuildSketch(Plane(origin=(-44.301038276, -19.710381189, 30), x_dir=(0, 0, -1), z_dir=(-1, 0, 0))):
        Circle(S_P_R1_PROFILE_R)
    s_p_r1 = sweep(path=s_p_r1_path.line)

    # Aynalama1: Süpür1 across plane
    add(s_p_r1.mirror(Plane(origin=(0, 0, 0), x_dir=(0, 0, 1), z_dir=(1, 0, 0))))

    # Çizim20 → Kes-Ekstrüzyon2 (cut)
    with BuildSketch(Plane(origin=(0, 0, 0), x_dir=(1, 0, 0), z_dir=(0, 1, 0)).offset(KES_EKSTR_ZYON2_START)):
        with Locations(Location((0, -50, 0), (0, 0, 270))):
            Circle(IZIM20_R)
    kes_ekstr_zyon2 = extrude(amount=-KES_EKSTR_ZYON2_DEPTH, mode=Mode.SUBTRACT)

    # Aynalama2: Kes-Ekstrüzyon2 across plane
    add(kes_ekstr_zyon2.mirror(Plane.ZX), mode=Mode.SUBTRACT)

    # Çizim21 → Yükseklik-Ekstrüzyon2 (add, symmetric)
    with BuildSketch(Plane(origin=(0, 0, 0), x_dir=(1, 0, 0), z_dir=(0, 1, 0))):
        Polygon((-66.104532637, -35.126982438), (-61.664435601, -32.563491219), (-61.664435601, -27.436508781), (-66.104532637, -24.873017562), (-70.544629673, -27.436508781), (-70.544629673, -32.563491219), align=None)
    y_kseklik_ekstr_zyon2 = extrude(amount=Y_KSEKLIK_EKSTR_ZYON2_DEPTH, both=True)

    # Aynalama3: Yükseklik-Ekstrüzyon2 across plane
    add(y_kseklik_ekstr_zyon2.mirror(Plane(origin=(0, 0, 0), x_dir=(0, 0, 1), z_dir=(1, 0, 0))))


solid = part.part
